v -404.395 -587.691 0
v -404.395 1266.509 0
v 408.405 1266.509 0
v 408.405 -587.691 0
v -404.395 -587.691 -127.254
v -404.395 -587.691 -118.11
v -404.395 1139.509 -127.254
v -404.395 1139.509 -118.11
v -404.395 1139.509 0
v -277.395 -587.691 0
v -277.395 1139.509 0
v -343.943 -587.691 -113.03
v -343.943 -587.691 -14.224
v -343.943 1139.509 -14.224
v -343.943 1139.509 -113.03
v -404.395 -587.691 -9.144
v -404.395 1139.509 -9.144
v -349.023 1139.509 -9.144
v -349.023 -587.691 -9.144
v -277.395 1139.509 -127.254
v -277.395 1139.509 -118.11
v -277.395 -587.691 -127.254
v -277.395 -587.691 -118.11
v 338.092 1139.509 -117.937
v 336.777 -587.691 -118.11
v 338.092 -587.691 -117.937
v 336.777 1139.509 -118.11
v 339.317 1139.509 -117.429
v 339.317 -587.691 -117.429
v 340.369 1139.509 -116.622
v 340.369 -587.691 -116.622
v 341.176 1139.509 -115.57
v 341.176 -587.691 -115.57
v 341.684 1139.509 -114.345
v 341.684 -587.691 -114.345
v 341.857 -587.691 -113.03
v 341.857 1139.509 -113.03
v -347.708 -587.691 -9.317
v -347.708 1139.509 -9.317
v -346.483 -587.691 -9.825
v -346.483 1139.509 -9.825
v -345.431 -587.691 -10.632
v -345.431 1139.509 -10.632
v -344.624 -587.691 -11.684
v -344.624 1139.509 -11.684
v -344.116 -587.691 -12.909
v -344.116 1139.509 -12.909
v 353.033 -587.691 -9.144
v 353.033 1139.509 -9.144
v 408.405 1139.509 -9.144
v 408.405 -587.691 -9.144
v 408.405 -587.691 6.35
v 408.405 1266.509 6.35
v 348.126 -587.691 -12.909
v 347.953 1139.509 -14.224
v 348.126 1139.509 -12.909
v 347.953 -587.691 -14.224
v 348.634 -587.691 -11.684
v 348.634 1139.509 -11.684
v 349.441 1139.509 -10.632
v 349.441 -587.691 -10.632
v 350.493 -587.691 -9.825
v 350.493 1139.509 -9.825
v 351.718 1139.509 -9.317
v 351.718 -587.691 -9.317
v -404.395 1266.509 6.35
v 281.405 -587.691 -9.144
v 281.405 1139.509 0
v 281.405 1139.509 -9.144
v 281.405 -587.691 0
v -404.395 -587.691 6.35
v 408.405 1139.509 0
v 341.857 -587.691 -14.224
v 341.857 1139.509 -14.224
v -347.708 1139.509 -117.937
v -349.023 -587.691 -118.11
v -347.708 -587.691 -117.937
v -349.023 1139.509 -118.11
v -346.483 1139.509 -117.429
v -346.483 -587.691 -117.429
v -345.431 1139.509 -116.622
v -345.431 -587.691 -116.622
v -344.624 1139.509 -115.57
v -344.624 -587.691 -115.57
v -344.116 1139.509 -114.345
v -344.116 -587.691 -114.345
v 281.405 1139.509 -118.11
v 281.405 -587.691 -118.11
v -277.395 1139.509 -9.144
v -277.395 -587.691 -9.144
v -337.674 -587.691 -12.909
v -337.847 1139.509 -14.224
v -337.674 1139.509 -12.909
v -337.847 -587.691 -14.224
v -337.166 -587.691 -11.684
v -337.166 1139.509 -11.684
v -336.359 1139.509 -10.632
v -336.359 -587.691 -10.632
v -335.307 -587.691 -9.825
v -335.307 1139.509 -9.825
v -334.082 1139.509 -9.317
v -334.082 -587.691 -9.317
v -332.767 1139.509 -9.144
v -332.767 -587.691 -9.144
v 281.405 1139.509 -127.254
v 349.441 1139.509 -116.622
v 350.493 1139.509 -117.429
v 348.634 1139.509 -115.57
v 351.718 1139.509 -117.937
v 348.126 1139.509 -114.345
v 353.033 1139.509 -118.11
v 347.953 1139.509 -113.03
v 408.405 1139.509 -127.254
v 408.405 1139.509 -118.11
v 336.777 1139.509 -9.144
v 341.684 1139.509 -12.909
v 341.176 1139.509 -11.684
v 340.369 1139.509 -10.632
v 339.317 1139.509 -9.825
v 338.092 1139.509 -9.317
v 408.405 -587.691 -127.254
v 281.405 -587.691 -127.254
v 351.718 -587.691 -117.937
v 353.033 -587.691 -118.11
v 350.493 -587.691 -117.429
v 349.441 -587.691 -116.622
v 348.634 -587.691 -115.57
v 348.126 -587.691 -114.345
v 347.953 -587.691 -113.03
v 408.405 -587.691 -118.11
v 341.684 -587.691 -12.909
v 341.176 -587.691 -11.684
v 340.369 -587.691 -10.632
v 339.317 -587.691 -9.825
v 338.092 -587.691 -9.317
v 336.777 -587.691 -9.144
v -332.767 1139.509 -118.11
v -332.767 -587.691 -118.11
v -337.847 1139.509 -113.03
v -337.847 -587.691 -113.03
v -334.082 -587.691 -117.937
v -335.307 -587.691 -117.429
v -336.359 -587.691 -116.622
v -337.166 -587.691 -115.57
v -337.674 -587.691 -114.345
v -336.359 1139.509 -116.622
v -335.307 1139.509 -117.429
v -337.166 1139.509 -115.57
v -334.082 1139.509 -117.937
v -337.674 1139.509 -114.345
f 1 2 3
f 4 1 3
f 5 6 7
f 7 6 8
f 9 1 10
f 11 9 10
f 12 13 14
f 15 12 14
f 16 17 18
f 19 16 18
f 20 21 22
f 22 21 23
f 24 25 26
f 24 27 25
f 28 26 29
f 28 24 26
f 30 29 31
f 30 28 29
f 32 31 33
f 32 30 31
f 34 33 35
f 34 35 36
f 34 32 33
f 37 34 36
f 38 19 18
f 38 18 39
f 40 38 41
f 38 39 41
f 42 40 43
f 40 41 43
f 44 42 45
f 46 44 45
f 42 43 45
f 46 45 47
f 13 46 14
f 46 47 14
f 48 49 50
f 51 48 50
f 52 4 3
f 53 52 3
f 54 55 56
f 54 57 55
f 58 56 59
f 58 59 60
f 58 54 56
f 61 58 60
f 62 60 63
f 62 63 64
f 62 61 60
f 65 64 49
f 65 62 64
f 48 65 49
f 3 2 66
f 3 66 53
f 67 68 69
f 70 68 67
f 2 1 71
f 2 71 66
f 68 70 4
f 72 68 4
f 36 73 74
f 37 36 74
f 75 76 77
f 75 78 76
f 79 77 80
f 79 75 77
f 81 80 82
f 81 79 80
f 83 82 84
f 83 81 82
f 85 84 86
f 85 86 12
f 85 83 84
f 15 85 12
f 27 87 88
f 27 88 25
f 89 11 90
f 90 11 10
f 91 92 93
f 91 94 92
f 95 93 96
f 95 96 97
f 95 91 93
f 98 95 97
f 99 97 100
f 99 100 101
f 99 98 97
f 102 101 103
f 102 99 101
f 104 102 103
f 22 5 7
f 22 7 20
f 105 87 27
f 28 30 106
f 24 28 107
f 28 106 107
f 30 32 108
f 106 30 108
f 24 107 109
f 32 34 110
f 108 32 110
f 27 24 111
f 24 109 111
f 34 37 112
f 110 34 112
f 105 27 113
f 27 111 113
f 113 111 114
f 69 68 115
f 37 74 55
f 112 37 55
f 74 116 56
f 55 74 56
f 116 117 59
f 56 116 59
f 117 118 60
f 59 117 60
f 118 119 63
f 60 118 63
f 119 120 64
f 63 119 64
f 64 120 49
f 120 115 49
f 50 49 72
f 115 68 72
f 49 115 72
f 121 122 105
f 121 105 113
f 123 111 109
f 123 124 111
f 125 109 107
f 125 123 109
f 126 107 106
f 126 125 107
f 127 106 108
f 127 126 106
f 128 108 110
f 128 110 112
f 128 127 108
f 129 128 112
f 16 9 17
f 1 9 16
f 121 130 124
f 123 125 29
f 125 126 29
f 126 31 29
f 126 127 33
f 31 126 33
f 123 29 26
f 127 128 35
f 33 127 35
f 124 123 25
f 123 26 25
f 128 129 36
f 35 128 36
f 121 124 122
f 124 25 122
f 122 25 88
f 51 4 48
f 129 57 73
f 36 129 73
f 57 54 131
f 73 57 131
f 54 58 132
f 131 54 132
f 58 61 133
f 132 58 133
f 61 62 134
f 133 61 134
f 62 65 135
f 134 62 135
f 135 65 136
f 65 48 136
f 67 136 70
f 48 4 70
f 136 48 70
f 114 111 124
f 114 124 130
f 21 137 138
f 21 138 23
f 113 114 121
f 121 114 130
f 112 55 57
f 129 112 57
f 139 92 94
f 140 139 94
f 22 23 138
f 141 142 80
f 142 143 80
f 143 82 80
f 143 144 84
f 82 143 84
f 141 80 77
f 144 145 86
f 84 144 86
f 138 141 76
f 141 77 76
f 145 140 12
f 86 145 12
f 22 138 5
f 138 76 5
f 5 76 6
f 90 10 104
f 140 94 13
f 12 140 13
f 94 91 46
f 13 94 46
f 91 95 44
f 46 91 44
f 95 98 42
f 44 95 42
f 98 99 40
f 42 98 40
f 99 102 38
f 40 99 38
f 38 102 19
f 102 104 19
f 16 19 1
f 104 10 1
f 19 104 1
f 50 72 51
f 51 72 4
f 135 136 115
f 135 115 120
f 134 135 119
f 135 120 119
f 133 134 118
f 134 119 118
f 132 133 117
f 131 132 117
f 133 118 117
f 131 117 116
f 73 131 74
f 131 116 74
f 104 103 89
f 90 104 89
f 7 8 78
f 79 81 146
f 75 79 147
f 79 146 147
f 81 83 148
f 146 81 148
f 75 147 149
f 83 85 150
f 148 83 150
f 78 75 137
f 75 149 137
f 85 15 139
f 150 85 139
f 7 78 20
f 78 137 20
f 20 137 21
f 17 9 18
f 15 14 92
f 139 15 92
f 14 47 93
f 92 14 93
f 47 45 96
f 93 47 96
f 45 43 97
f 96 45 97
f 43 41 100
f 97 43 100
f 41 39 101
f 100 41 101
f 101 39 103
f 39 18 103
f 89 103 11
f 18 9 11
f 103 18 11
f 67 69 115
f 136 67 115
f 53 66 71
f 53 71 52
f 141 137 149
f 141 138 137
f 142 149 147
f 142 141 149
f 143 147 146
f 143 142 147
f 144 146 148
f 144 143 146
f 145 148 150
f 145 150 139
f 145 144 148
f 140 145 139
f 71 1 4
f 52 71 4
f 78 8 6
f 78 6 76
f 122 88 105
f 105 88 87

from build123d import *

# Parameters (mm, degrees)
F0_W      = 812.8
F0_H      = 1854.2
F1_DEPTH  = 6.35
F2_W      = 127
F2_H      = 1727.2
F3_DEPTH  = 9.144
F5_DEPTH  = 108.966
F7_DEPTH  = 9.144
F8_W      = 127
F8_H      = 1727.2
F9_DEPTH  = 9.144
F11_DEPTH = 108.966
F13_DEPTH = 9.144
F14_R     = 5.08
F15_R     = 5.08


with BuildPart() as f1:
    # F0 (on Top) → F1 (new body)
    with BuildSketch(Plane.XY):
        with Locations((2.005026, 339.408812)):
            Rectangle(F0_W, F0_H)
    extrude(amount=F1_DEPTH)


with BuildPart() as f3:
    # F2 (on face) → F3 (new body)
    with BuildSketch(Plane(origin=(0, 0, 0), x_dir=(1, 0, 0), z_dir=(0, 0, -1))):
        with Locations((-340.894974, -275.908812)):
            Rectangle(F2_W, F2_H)
    extrude(amount=F3_DEPTH)

    # F4 (on face) → F5 (join)
    with BuildSketch(Plane(origin=(0, 0, -9.144), x_dir=(1, 0, 0), z_dir=(0, 0, -1))):
        Polygon((-337.846974, 587.691188), (-340.894974, 587.691188), (-343.942974, 587.691188), (-343.942974, -1139.508812), (-337.846974, -1139.508812), align=None)
    extrude(amount=F5_DEPTH)

    # F6 (on face) → F7 (join)
    with BuildSketch(Plane(origin=(0, 0, -118.11), x_dir=(1, 0, 0), z_dir=(0, 0, -1))):
        Polygon((-277.394974, 587.691188), (-340.894974, 587.691188), (-404.394974, 587.691188), (-404.394974, -1139.508812), (-277.394974, -1139.508812), align=None)
    extrude(amount=F7_DEPTH)

    # F14
    f14_edges = [f3.edges().sort_by_distance(p)[0] for p in [
        (-343.942974, 275.908812, -9.144),
        (-343.942974, 275.908812, -118.11),
        (-337.846974, 275.908812, -118.11),
        (-337.846974, 275.908812, -9.144),
    ]]
    fillet(f14_edges, radius=F14_R)


with BuildPart() as f9:
    # F8 (on face) → F9 (new body)
    with BuildSketch(Plane(origin=(0, 0, 0), x_dir=(1, 0, 0), z_dir=(0, 0, -1))):
        with Locations((344.905026, -275.908812)):
            Rectangle(F8_W, F8_H)
    extrude(amount=F9_DEPTH)

    # F10 (on face) → F11 (join)
    with BuildSketch(Plane(origin=(0, 0, -9.144), x_dir=(1, 0, 0), z_dir=(0, 0, -1))):
        Polygon((347.953026, 587.691188), (344.905026, 587.691188), (341.857026, 587.691188), (341.857026, -1139.508812), (347.953026, -1139.508812), align=None)
    extrude(amount=F11_DEPTH)

    # F12 (on face) → F13 (join)
    with BuildSketch(Plane(origin=(0, 0, -118.11), x_dir=(1, 0, 0), z_dir=(0, 0, -1))):
        Polygon((408.405026, 587.691188), (344.905026, 587.691188), (281.405026, 587.691188), (281.405026, -1139.508812), (408.405026, -1139.508812), align=None)
    extrude(amount=F13_DEPTH)

    # F15
    f15_edges = [f9.edges().sort_by_distance(p)[0] for p in [
        (347.953026, 275.908812, -9.144),
        (347.953026, 275.908812, -118.11),
        (341.857026, 275.908812, -9.144),
        (341.857026, 275.908812, -118.11),
    ]]
    fillet(f15_edges, radius=F15_R)


solid = Compound([f1.part, f3.part, f9.part])
